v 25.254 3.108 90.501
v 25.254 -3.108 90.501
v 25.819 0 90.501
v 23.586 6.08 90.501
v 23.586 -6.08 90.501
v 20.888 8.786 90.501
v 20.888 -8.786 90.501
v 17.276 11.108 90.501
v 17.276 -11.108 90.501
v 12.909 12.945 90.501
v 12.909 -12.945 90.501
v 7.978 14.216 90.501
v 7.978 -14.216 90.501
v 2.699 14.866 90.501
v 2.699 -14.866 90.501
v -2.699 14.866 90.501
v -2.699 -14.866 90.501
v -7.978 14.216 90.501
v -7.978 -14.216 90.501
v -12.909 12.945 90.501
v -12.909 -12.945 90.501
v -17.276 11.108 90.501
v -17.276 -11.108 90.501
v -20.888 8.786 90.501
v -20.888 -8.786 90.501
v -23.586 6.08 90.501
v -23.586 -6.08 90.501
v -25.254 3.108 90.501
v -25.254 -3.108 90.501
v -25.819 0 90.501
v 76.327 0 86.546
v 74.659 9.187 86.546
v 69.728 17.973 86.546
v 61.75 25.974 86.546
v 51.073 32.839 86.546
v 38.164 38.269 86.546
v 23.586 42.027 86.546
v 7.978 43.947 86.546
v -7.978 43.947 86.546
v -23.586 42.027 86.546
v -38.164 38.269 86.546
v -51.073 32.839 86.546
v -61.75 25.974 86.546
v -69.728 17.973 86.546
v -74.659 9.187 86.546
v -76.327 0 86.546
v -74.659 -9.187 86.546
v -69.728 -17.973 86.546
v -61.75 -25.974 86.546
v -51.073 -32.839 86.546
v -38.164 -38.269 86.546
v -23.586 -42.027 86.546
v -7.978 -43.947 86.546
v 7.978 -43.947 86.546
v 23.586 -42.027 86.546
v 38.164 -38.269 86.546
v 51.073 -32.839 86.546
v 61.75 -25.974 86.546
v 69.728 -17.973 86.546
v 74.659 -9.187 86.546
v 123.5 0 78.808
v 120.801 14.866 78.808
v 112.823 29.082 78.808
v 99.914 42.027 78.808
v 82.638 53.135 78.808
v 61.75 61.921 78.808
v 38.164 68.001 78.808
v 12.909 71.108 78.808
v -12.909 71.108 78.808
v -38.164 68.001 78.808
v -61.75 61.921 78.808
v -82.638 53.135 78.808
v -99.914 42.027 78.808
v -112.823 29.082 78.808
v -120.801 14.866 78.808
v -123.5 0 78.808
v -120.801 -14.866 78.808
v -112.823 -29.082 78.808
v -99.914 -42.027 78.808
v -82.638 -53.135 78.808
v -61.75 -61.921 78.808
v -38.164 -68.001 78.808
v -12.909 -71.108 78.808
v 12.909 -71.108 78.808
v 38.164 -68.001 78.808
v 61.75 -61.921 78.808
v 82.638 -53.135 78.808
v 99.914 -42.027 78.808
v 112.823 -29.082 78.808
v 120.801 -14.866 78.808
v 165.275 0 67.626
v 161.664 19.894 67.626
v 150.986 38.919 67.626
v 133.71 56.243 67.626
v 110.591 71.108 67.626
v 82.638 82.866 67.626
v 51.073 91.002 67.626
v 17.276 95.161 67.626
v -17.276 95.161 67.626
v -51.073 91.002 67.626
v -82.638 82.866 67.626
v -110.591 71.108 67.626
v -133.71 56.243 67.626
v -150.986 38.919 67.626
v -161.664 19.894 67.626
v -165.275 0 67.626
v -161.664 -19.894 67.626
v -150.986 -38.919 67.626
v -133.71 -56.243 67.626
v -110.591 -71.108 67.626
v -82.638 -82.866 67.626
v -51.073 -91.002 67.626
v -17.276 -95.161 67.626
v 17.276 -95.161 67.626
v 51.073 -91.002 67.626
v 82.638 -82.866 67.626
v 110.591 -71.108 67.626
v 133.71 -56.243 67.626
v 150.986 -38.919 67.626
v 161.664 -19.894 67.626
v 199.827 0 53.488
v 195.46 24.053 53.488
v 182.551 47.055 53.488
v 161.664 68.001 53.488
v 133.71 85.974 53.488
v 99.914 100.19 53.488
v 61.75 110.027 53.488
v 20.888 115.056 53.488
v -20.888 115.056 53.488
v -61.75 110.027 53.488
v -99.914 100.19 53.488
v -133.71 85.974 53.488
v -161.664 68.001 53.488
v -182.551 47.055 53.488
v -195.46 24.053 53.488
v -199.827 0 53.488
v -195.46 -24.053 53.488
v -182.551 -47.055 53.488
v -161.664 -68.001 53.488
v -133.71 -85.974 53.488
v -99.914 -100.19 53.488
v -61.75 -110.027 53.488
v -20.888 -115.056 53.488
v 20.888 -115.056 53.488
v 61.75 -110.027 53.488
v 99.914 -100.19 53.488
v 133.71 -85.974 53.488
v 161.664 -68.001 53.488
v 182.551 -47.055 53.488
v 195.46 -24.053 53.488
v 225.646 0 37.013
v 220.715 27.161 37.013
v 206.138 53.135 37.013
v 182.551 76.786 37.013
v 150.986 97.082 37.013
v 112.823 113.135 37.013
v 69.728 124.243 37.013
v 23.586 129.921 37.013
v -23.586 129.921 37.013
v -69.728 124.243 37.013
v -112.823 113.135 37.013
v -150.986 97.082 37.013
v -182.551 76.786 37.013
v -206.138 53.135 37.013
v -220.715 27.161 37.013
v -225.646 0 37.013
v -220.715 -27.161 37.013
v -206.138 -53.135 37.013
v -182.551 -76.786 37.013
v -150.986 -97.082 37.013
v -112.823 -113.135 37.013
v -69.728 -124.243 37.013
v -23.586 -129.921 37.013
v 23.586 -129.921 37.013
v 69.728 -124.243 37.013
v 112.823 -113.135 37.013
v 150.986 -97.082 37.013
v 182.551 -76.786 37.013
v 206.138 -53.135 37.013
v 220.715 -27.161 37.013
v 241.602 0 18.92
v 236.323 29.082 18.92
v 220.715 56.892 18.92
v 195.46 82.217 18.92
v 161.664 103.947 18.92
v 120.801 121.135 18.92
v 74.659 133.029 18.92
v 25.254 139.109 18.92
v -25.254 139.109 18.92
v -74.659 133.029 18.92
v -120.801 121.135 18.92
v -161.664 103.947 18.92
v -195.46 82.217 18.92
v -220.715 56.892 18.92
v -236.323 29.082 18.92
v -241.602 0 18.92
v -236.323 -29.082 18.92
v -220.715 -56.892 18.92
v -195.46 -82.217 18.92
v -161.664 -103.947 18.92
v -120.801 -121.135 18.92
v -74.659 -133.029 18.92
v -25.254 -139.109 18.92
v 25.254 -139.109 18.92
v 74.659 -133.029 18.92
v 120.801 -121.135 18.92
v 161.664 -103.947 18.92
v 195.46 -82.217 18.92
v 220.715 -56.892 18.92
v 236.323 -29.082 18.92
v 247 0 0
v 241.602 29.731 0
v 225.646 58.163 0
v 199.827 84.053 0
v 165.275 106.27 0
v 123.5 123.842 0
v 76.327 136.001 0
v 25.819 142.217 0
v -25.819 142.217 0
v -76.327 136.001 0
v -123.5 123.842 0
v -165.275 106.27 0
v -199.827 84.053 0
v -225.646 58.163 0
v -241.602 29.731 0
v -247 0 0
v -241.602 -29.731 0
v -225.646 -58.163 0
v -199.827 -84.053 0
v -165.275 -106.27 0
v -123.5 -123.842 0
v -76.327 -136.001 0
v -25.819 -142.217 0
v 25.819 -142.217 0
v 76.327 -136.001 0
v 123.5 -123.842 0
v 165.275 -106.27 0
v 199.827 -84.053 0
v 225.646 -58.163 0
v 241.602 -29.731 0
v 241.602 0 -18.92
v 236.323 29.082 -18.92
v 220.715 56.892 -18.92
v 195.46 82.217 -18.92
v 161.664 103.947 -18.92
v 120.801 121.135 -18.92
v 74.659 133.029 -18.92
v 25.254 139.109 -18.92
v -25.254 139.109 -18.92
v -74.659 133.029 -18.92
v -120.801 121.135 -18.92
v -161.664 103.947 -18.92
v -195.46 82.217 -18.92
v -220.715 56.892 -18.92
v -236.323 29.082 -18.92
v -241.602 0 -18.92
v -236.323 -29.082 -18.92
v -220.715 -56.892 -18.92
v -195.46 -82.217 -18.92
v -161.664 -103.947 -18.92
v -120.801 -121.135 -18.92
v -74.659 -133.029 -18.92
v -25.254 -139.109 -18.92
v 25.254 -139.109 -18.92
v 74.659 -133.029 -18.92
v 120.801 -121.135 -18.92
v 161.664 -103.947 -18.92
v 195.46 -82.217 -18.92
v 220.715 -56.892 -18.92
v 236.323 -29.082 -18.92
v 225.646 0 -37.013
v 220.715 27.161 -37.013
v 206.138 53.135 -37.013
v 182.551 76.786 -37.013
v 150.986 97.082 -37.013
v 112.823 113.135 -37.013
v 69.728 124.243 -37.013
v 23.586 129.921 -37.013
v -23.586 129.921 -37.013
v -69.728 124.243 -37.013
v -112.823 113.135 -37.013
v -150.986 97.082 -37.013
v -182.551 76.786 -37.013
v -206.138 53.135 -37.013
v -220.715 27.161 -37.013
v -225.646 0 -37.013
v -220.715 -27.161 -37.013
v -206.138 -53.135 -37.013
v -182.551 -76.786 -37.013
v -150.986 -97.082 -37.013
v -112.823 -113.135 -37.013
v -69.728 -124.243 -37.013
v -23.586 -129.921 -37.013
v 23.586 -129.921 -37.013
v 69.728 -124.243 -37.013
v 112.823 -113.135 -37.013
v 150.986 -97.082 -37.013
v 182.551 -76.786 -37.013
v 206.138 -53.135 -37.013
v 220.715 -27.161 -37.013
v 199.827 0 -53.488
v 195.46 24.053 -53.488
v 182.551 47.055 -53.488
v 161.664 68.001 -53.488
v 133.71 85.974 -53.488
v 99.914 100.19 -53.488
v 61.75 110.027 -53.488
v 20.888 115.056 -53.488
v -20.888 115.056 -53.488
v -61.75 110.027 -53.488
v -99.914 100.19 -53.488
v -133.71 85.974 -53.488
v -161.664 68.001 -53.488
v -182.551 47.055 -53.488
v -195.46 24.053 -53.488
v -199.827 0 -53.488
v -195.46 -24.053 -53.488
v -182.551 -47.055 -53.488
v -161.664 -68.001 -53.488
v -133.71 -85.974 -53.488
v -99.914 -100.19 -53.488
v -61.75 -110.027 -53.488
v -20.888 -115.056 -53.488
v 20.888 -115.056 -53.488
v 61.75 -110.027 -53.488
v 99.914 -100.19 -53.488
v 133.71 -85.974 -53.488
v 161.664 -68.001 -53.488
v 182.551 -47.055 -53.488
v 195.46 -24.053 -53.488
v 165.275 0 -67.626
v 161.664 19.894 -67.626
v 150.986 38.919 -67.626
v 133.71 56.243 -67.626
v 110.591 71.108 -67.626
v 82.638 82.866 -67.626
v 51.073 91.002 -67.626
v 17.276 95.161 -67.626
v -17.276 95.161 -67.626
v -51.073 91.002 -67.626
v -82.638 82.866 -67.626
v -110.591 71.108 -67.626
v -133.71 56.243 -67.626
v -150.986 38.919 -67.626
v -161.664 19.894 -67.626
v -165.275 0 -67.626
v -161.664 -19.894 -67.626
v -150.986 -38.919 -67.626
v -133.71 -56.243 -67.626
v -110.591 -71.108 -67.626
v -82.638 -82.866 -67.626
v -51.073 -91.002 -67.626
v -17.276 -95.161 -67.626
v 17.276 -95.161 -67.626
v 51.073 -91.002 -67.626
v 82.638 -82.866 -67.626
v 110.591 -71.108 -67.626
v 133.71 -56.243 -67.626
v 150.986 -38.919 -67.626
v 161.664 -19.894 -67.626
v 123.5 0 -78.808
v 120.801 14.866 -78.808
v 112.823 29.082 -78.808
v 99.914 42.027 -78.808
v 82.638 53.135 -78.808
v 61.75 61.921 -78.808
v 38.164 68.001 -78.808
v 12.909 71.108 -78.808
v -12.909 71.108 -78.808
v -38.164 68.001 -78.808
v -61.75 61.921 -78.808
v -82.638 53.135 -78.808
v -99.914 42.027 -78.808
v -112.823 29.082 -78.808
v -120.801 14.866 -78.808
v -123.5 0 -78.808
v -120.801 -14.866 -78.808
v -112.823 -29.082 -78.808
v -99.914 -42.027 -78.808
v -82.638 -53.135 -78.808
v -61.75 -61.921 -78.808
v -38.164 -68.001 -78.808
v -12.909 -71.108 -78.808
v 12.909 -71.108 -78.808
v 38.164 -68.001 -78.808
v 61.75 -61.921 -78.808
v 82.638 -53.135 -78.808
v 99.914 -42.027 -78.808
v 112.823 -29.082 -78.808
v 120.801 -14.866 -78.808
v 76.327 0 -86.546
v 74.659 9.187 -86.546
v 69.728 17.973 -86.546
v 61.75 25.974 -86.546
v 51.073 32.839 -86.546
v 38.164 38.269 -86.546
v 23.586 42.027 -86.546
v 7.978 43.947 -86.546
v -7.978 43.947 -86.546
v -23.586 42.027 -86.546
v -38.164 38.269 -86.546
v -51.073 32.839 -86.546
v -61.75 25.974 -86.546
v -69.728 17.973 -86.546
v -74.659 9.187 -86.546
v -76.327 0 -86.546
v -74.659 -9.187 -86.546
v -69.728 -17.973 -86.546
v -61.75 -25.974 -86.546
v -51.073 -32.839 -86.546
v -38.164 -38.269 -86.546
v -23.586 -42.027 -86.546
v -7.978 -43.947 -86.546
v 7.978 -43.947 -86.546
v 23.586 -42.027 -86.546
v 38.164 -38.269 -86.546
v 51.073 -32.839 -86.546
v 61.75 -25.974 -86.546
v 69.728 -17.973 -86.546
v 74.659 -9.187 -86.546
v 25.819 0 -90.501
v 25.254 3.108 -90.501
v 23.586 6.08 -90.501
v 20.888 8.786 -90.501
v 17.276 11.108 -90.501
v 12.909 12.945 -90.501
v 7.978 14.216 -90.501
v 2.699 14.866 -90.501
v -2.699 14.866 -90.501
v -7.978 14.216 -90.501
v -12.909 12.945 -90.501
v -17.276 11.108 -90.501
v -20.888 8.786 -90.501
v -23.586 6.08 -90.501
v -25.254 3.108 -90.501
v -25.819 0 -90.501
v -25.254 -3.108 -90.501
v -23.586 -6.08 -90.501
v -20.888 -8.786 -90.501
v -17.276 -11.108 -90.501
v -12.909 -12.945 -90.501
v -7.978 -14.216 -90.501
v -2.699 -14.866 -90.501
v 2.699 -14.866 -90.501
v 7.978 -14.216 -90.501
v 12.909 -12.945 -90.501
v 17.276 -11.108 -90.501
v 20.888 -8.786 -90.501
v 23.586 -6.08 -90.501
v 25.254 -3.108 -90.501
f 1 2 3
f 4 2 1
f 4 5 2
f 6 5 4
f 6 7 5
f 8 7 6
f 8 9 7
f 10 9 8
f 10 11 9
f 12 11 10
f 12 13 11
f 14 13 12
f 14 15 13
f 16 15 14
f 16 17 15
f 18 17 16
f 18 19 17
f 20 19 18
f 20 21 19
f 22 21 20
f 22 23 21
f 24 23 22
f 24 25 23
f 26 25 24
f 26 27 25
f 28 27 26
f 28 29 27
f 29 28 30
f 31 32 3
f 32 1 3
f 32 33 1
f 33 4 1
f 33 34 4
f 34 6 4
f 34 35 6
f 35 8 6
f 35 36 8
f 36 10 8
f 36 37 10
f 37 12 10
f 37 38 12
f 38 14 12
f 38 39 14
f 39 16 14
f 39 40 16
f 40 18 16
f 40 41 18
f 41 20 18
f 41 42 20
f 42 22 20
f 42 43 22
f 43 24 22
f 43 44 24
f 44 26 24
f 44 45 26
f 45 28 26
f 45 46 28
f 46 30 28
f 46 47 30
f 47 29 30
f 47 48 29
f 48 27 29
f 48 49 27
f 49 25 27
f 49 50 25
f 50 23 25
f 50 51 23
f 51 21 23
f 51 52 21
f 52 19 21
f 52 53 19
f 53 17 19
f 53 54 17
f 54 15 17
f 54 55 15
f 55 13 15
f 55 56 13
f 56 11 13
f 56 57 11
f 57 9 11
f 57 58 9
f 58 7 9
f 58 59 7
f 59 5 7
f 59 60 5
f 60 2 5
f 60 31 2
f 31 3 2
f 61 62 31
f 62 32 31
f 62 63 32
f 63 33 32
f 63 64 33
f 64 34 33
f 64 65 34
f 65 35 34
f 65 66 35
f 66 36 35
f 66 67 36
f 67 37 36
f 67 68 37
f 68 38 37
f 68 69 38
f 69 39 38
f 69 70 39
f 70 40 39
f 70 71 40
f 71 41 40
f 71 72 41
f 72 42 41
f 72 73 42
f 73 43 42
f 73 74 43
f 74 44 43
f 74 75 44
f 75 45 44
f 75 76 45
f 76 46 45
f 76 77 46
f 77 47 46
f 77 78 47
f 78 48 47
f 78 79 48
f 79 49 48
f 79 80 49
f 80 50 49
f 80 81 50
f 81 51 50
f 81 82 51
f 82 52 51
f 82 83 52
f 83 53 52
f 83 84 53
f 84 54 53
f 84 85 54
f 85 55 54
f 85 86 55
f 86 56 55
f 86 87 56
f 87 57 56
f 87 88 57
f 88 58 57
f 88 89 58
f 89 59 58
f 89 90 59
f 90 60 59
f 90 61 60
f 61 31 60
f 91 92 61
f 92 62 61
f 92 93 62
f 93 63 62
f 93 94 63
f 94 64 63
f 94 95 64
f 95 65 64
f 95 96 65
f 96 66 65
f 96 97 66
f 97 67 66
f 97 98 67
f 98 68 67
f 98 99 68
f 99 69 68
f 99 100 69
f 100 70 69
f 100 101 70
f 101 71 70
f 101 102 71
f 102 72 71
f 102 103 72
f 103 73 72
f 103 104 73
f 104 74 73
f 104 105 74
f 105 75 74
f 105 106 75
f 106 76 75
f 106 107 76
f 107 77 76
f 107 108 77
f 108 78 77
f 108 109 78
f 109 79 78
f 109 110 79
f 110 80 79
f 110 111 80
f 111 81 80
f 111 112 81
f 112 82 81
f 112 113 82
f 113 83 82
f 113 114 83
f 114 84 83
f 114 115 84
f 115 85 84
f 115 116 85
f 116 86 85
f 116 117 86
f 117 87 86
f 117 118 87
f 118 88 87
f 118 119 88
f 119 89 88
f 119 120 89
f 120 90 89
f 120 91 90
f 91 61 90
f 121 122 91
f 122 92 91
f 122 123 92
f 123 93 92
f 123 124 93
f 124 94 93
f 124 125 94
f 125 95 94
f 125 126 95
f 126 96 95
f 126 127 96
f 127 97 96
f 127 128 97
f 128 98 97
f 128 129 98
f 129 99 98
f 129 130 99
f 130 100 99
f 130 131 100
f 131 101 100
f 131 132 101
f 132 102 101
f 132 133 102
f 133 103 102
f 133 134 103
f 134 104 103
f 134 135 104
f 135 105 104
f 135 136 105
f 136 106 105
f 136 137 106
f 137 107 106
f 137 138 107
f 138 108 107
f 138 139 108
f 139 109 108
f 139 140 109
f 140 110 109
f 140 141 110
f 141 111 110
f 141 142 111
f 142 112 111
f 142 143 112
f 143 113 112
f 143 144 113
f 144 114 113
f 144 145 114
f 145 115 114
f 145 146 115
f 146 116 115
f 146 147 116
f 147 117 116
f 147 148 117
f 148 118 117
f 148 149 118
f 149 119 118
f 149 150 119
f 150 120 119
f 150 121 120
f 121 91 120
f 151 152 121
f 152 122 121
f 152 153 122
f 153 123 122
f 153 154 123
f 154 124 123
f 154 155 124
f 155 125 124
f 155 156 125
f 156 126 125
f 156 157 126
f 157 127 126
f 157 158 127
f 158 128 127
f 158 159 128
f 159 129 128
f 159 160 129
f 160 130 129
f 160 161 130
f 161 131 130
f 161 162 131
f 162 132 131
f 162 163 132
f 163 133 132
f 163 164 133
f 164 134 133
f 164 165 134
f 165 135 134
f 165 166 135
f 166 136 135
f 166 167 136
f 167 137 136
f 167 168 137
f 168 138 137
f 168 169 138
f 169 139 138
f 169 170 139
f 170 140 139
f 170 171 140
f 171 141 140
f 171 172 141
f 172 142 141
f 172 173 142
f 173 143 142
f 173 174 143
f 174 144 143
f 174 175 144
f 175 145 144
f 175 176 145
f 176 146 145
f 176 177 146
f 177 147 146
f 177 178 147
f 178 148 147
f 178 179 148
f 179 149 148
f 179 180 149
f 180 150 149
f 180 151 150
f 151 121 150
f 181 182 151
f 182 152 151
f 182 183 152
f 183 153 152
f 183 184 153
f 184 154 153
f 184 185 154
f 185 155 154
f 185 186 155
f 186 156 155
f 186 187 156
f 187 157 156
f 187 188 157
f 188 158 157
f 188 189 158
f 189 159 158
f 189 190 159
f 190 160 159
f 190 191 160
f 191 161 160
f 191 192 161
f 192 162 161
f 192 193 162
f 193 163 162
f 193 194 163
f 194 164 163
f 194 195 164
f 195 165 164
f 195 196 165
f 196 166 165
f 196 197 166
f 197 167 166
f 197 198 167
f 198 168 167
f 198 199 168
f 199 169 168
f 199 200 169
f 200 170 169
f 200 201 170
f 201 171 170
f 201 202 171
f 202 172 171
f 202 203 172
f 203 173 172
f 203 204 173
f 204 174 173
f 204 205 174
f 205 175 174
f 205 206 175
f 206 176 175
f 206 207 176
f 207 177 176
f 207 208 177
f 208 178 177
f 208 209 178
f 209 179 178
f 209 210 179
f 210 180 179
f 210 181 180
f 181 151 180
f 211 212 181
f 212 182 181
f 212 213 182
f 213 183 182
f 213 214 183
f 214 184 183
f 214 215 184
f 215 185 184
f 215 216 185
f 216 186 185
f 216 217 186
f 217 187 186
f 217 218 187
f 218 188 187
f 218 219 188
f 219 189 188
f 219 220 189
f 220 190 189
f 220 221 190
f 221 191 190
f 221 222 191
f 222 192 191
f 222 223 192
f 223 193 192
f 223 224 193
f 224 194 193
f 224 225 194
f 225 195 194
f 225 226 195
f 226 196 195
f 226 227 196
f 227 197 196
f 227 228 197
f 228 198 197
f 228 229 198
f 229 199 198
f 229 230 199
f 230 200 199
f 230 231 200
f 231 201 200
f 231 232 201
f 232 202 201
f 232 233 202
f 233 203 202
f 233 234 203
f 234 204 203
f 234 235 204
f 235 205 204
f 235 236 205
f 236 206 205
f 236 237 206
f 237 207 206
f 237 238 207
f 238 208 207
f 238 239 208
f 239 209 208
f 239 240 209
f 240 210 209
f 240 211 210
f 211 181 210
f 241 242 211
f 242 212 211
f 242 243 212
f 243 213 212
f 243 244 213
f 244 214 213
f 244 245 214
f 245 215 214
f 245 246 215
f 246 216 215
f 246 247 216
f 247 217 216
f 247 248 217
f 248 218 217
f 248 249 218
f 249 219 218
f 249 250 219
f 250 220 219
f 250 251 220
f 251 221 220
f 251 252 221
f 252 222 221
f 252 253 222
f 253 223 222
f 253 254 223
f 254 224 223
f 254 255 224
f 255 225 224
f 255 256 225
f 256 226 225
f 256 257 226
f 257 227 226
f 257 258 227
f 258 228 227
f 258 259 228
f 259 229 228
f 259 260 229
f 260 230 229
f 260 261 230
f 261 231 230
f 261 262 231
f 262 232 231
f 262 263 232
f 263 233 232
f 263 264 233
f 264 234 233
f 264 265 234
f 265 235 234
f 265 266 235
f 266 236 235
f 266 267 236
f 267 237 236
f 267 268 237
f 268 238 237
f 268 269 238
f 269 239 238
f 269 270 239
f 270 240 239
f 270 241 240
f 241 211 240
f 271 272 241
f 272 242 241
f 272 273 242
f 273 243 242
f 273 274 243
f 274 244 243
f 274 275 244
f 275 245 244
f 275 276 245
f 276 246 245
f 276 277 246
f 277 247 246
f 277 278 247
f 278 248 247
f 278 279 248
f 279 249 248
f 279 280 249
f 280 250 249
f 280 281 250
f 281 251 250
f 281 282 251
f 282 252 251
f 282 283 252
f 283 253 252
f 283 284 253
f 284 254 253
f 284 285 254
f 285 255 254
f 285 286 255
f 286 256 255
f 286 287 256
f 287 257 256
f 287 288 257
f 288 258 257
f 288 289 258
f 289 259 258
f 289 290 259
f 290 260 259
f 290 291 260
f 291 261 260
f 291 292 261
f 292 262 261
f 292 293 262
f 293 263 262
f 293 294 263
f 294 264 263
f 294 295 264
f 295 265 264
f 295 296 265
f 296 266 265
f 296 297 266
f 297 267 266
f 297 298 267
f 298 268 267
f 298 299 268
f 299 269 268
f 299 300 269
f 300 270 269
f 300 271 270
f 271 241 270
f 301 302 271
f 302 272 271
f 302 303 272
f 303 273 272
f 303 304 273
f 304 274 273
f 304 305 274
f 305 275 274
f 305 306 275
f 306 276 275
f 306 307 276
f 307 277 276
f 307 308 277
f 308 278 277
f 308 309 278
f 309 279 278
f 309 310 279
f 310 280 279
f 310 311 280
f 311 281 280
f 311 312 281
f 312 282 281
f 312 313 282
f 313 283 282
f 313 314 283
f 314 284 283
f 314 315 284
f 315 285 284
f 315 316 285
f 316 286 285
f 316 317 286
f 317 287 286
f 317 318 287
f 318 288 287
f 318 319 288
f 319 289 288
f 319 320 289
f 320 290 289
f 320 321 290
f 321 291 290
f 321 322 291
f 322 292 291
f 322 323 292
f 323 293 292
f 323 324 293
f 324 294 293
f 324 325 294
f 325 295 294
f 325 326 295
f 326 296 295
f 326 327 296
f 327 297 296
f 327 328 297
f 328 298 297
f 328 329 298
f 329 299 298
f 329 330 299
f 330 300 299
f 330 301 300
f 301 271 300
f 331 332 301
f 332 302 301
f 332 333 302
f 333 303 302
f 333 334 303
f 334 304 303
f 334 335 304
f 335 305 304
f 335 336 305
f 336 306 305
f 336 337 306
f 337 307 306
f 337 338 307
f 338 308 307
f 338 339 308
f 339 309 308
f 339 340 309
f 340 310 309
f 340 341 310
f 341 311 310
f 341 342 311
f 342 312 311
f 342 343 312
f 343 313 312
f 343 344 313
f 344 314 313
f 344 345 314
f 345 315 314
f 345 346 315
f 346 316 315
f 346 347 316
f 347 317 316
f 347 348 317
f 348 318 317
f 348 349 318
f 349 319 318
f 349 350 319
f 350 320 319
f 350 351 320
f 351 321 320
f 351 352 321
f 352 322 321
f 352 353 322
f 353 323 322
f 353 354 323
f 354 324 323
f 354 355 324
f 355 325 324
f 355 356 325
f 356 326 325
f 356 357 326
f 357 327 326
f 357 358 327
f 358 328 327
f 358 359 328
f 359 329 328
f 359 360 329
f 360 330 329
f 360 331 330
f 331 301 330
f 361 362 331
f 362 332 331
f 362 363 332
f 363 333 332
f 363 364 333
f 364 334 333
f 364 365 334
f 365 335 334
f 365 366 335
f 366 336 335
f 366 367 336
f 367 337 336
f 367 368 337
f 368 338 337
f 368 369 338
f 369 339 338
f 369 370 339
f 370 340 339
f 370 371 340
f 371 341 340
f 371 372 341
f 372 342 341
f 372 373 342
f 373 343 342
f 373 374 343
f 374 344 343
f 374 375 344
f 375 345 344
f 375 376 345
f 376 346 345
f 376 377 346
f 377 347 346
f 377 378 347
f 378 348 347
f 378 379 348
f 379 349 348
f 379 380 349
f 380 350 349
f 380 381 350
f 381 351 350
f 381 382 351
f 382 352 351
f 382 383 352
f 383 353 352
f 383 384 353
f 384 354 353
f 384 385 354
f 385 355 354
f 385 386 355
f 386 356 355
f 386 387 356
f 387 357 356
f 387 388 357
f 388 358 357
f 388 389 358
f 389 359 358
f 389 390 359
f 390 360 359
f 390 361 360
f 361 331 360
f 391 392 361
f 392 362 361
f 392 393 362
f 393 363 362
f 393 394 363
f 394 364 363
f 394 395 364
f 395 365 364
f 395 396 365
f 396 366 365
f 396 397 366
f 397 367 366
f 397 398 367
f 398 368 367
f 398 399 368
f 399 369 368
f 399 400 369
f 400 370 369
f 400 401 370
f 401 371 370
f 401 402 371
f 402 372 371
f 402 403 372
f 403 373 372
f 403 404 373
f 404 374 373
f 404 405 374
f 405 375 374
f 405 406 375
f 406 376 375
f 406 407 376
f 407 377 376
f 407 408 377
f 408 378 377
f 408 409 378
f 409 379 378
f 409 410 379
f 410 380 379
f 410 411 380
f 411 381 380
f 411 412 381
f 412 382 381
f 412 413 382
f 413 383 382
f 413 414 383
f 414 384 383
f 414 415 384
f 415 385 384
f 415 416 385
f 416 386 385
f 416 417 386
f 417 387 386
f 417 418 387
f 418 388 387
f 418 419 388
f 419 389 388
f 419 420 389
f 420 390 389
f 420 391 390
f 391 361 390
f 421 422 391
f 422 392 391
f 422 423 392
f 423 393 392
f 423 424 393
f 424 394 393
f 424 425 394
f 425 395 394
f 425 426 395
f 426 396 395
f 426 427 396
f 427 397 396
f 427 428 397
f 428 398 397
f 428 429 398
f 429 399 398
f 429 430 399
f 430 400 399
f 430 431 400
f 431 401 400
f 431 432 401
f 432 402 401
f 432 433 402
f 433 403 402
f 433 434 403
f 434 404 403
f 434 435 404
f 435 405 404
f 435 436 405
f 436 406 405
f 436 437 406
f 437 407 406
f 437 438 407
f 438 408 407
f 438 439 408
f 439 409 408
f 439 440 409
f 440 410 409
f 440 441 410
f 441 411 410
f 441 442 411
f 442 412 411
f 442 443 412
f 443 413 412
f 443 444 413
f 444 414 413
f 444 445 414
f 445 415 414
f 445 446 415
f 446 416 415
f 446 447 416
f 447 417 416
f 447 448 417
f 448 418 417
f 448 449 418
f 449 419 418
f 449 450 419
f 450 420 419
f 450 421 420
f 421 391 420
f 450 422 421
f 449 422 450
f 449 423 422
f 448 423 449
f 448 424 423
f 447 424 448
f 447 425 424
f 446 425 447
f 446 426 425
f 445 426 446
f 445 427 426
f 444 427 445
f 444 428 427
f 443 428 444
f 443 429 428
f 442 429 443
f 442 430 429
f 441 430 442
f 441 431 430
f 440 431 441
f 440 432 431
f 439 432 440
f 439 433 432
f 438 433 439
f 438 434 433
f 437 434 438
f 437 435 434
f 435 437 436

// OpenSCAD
// Generated by SolidPython 1.0.1 on 2020-07-29 00:46:54


scale(v = [19, 11, 7]) {
	sphere(r = 13);
}
/***********************************************
*********      SolidPython code:      **********
************************************************
 
# import packages: SolidPython
from solid import *
from solid.utils import *
from itertools import chain, combinations, permutations


class Resize:

    def __init__(self, scad_file):
        self.scad_file = scad_file
        #self.scad_file = import_scad(scad_file)
        # cone/cylinder param:
        self.r1 = 0
        self.r2 = 0
        self.h = 0
        # rectangular prism param:
        self.w = 0
        self.l = 0
        # ellipse param:
        self.r = 0

    # import OpenScad code (file name corresponds to shape)


    # classify shape + parameters
    def assign(self, param1, param2, param3):
        if self.scad_file == 'cone.scad':
            self.r1 = param1
            self.r2 = param2
            self.h = param3
        elif self.scad_file == 'cylinder.scad':
            self.r1 = param1
            self.r2 = param2
            self.h = param3
        elif self.scad_file == 'rectangularPrism.scad':
            self.h = param1
            self.l = param2
            self.w = param3
        else:
            self.r = param1
            self.h = param2

    # resize parameters
    def iterate(self):
        x = range(3, 20, 2)
        i = 1
        if self.scad_file == 'cone.scad':
            tempList = list(permutations(x, 2))
            for temp in tempList:
                param1 = temp[0]
                param2 = temp[1]
                filepath = 'produced_scad_files/' + 'cone' + str(param1) + '_' + str(param2) + '_' + '.scad'
                scad_render_to_file(cylinder(h=param1, r1=param2, r2=0), filepath)

        elif self.scad_file == 'cylinder.scad':
            tempList = list(permutations(x, 3))
            for temp in tempList:
                param1 = temp[0]
                param2 = temp[1]
                filepath = 'produced_scad_files/' + 'cylinder' + str(param1) + '_' + str(param2) + '_' + '.scad'
                scad_render_to_file(cylinder(h=param1, r1=param2, r2=param2), filepath)

        elif self.scad_file == 'rectangularPrism.scad':
            tempList = list(permutations(x, 3))
            for temp in tempList:
                param1 = temp[0]
                param2 = temp[1]
                param3 = temp[2]
                filepath = 'produced_scad_files/' + 'rectangularPrism' + str(param1) + '_' + str(param2) + '_' + str(
                    param3) + '.scad'
                scad_render_to_file(cube(size=(param1, param2, param3)), filepath)

        elif self.scad_file == 'ellipse.scad':
            tempList = list(permutations(x, 4))
            for temp in tempList:
                param1 = temp[0]
                param2 = temp[1]
                param3 = temp[2]
                param4 = temp[3]
                filepath = 'produced_scad_files/' + 'ellipse' + str(param1) + '_' + str(param2) + '_' + str(param3) + '_' + str(param4) + '.scad'
                scad_render_to_file(scale([param1, param2, param3])(sphere(r=param4)), filepath)

    def render_to_scadfile(self):
        scad_render_to_file(scad, 'example.scad') 
 
************************************************/
